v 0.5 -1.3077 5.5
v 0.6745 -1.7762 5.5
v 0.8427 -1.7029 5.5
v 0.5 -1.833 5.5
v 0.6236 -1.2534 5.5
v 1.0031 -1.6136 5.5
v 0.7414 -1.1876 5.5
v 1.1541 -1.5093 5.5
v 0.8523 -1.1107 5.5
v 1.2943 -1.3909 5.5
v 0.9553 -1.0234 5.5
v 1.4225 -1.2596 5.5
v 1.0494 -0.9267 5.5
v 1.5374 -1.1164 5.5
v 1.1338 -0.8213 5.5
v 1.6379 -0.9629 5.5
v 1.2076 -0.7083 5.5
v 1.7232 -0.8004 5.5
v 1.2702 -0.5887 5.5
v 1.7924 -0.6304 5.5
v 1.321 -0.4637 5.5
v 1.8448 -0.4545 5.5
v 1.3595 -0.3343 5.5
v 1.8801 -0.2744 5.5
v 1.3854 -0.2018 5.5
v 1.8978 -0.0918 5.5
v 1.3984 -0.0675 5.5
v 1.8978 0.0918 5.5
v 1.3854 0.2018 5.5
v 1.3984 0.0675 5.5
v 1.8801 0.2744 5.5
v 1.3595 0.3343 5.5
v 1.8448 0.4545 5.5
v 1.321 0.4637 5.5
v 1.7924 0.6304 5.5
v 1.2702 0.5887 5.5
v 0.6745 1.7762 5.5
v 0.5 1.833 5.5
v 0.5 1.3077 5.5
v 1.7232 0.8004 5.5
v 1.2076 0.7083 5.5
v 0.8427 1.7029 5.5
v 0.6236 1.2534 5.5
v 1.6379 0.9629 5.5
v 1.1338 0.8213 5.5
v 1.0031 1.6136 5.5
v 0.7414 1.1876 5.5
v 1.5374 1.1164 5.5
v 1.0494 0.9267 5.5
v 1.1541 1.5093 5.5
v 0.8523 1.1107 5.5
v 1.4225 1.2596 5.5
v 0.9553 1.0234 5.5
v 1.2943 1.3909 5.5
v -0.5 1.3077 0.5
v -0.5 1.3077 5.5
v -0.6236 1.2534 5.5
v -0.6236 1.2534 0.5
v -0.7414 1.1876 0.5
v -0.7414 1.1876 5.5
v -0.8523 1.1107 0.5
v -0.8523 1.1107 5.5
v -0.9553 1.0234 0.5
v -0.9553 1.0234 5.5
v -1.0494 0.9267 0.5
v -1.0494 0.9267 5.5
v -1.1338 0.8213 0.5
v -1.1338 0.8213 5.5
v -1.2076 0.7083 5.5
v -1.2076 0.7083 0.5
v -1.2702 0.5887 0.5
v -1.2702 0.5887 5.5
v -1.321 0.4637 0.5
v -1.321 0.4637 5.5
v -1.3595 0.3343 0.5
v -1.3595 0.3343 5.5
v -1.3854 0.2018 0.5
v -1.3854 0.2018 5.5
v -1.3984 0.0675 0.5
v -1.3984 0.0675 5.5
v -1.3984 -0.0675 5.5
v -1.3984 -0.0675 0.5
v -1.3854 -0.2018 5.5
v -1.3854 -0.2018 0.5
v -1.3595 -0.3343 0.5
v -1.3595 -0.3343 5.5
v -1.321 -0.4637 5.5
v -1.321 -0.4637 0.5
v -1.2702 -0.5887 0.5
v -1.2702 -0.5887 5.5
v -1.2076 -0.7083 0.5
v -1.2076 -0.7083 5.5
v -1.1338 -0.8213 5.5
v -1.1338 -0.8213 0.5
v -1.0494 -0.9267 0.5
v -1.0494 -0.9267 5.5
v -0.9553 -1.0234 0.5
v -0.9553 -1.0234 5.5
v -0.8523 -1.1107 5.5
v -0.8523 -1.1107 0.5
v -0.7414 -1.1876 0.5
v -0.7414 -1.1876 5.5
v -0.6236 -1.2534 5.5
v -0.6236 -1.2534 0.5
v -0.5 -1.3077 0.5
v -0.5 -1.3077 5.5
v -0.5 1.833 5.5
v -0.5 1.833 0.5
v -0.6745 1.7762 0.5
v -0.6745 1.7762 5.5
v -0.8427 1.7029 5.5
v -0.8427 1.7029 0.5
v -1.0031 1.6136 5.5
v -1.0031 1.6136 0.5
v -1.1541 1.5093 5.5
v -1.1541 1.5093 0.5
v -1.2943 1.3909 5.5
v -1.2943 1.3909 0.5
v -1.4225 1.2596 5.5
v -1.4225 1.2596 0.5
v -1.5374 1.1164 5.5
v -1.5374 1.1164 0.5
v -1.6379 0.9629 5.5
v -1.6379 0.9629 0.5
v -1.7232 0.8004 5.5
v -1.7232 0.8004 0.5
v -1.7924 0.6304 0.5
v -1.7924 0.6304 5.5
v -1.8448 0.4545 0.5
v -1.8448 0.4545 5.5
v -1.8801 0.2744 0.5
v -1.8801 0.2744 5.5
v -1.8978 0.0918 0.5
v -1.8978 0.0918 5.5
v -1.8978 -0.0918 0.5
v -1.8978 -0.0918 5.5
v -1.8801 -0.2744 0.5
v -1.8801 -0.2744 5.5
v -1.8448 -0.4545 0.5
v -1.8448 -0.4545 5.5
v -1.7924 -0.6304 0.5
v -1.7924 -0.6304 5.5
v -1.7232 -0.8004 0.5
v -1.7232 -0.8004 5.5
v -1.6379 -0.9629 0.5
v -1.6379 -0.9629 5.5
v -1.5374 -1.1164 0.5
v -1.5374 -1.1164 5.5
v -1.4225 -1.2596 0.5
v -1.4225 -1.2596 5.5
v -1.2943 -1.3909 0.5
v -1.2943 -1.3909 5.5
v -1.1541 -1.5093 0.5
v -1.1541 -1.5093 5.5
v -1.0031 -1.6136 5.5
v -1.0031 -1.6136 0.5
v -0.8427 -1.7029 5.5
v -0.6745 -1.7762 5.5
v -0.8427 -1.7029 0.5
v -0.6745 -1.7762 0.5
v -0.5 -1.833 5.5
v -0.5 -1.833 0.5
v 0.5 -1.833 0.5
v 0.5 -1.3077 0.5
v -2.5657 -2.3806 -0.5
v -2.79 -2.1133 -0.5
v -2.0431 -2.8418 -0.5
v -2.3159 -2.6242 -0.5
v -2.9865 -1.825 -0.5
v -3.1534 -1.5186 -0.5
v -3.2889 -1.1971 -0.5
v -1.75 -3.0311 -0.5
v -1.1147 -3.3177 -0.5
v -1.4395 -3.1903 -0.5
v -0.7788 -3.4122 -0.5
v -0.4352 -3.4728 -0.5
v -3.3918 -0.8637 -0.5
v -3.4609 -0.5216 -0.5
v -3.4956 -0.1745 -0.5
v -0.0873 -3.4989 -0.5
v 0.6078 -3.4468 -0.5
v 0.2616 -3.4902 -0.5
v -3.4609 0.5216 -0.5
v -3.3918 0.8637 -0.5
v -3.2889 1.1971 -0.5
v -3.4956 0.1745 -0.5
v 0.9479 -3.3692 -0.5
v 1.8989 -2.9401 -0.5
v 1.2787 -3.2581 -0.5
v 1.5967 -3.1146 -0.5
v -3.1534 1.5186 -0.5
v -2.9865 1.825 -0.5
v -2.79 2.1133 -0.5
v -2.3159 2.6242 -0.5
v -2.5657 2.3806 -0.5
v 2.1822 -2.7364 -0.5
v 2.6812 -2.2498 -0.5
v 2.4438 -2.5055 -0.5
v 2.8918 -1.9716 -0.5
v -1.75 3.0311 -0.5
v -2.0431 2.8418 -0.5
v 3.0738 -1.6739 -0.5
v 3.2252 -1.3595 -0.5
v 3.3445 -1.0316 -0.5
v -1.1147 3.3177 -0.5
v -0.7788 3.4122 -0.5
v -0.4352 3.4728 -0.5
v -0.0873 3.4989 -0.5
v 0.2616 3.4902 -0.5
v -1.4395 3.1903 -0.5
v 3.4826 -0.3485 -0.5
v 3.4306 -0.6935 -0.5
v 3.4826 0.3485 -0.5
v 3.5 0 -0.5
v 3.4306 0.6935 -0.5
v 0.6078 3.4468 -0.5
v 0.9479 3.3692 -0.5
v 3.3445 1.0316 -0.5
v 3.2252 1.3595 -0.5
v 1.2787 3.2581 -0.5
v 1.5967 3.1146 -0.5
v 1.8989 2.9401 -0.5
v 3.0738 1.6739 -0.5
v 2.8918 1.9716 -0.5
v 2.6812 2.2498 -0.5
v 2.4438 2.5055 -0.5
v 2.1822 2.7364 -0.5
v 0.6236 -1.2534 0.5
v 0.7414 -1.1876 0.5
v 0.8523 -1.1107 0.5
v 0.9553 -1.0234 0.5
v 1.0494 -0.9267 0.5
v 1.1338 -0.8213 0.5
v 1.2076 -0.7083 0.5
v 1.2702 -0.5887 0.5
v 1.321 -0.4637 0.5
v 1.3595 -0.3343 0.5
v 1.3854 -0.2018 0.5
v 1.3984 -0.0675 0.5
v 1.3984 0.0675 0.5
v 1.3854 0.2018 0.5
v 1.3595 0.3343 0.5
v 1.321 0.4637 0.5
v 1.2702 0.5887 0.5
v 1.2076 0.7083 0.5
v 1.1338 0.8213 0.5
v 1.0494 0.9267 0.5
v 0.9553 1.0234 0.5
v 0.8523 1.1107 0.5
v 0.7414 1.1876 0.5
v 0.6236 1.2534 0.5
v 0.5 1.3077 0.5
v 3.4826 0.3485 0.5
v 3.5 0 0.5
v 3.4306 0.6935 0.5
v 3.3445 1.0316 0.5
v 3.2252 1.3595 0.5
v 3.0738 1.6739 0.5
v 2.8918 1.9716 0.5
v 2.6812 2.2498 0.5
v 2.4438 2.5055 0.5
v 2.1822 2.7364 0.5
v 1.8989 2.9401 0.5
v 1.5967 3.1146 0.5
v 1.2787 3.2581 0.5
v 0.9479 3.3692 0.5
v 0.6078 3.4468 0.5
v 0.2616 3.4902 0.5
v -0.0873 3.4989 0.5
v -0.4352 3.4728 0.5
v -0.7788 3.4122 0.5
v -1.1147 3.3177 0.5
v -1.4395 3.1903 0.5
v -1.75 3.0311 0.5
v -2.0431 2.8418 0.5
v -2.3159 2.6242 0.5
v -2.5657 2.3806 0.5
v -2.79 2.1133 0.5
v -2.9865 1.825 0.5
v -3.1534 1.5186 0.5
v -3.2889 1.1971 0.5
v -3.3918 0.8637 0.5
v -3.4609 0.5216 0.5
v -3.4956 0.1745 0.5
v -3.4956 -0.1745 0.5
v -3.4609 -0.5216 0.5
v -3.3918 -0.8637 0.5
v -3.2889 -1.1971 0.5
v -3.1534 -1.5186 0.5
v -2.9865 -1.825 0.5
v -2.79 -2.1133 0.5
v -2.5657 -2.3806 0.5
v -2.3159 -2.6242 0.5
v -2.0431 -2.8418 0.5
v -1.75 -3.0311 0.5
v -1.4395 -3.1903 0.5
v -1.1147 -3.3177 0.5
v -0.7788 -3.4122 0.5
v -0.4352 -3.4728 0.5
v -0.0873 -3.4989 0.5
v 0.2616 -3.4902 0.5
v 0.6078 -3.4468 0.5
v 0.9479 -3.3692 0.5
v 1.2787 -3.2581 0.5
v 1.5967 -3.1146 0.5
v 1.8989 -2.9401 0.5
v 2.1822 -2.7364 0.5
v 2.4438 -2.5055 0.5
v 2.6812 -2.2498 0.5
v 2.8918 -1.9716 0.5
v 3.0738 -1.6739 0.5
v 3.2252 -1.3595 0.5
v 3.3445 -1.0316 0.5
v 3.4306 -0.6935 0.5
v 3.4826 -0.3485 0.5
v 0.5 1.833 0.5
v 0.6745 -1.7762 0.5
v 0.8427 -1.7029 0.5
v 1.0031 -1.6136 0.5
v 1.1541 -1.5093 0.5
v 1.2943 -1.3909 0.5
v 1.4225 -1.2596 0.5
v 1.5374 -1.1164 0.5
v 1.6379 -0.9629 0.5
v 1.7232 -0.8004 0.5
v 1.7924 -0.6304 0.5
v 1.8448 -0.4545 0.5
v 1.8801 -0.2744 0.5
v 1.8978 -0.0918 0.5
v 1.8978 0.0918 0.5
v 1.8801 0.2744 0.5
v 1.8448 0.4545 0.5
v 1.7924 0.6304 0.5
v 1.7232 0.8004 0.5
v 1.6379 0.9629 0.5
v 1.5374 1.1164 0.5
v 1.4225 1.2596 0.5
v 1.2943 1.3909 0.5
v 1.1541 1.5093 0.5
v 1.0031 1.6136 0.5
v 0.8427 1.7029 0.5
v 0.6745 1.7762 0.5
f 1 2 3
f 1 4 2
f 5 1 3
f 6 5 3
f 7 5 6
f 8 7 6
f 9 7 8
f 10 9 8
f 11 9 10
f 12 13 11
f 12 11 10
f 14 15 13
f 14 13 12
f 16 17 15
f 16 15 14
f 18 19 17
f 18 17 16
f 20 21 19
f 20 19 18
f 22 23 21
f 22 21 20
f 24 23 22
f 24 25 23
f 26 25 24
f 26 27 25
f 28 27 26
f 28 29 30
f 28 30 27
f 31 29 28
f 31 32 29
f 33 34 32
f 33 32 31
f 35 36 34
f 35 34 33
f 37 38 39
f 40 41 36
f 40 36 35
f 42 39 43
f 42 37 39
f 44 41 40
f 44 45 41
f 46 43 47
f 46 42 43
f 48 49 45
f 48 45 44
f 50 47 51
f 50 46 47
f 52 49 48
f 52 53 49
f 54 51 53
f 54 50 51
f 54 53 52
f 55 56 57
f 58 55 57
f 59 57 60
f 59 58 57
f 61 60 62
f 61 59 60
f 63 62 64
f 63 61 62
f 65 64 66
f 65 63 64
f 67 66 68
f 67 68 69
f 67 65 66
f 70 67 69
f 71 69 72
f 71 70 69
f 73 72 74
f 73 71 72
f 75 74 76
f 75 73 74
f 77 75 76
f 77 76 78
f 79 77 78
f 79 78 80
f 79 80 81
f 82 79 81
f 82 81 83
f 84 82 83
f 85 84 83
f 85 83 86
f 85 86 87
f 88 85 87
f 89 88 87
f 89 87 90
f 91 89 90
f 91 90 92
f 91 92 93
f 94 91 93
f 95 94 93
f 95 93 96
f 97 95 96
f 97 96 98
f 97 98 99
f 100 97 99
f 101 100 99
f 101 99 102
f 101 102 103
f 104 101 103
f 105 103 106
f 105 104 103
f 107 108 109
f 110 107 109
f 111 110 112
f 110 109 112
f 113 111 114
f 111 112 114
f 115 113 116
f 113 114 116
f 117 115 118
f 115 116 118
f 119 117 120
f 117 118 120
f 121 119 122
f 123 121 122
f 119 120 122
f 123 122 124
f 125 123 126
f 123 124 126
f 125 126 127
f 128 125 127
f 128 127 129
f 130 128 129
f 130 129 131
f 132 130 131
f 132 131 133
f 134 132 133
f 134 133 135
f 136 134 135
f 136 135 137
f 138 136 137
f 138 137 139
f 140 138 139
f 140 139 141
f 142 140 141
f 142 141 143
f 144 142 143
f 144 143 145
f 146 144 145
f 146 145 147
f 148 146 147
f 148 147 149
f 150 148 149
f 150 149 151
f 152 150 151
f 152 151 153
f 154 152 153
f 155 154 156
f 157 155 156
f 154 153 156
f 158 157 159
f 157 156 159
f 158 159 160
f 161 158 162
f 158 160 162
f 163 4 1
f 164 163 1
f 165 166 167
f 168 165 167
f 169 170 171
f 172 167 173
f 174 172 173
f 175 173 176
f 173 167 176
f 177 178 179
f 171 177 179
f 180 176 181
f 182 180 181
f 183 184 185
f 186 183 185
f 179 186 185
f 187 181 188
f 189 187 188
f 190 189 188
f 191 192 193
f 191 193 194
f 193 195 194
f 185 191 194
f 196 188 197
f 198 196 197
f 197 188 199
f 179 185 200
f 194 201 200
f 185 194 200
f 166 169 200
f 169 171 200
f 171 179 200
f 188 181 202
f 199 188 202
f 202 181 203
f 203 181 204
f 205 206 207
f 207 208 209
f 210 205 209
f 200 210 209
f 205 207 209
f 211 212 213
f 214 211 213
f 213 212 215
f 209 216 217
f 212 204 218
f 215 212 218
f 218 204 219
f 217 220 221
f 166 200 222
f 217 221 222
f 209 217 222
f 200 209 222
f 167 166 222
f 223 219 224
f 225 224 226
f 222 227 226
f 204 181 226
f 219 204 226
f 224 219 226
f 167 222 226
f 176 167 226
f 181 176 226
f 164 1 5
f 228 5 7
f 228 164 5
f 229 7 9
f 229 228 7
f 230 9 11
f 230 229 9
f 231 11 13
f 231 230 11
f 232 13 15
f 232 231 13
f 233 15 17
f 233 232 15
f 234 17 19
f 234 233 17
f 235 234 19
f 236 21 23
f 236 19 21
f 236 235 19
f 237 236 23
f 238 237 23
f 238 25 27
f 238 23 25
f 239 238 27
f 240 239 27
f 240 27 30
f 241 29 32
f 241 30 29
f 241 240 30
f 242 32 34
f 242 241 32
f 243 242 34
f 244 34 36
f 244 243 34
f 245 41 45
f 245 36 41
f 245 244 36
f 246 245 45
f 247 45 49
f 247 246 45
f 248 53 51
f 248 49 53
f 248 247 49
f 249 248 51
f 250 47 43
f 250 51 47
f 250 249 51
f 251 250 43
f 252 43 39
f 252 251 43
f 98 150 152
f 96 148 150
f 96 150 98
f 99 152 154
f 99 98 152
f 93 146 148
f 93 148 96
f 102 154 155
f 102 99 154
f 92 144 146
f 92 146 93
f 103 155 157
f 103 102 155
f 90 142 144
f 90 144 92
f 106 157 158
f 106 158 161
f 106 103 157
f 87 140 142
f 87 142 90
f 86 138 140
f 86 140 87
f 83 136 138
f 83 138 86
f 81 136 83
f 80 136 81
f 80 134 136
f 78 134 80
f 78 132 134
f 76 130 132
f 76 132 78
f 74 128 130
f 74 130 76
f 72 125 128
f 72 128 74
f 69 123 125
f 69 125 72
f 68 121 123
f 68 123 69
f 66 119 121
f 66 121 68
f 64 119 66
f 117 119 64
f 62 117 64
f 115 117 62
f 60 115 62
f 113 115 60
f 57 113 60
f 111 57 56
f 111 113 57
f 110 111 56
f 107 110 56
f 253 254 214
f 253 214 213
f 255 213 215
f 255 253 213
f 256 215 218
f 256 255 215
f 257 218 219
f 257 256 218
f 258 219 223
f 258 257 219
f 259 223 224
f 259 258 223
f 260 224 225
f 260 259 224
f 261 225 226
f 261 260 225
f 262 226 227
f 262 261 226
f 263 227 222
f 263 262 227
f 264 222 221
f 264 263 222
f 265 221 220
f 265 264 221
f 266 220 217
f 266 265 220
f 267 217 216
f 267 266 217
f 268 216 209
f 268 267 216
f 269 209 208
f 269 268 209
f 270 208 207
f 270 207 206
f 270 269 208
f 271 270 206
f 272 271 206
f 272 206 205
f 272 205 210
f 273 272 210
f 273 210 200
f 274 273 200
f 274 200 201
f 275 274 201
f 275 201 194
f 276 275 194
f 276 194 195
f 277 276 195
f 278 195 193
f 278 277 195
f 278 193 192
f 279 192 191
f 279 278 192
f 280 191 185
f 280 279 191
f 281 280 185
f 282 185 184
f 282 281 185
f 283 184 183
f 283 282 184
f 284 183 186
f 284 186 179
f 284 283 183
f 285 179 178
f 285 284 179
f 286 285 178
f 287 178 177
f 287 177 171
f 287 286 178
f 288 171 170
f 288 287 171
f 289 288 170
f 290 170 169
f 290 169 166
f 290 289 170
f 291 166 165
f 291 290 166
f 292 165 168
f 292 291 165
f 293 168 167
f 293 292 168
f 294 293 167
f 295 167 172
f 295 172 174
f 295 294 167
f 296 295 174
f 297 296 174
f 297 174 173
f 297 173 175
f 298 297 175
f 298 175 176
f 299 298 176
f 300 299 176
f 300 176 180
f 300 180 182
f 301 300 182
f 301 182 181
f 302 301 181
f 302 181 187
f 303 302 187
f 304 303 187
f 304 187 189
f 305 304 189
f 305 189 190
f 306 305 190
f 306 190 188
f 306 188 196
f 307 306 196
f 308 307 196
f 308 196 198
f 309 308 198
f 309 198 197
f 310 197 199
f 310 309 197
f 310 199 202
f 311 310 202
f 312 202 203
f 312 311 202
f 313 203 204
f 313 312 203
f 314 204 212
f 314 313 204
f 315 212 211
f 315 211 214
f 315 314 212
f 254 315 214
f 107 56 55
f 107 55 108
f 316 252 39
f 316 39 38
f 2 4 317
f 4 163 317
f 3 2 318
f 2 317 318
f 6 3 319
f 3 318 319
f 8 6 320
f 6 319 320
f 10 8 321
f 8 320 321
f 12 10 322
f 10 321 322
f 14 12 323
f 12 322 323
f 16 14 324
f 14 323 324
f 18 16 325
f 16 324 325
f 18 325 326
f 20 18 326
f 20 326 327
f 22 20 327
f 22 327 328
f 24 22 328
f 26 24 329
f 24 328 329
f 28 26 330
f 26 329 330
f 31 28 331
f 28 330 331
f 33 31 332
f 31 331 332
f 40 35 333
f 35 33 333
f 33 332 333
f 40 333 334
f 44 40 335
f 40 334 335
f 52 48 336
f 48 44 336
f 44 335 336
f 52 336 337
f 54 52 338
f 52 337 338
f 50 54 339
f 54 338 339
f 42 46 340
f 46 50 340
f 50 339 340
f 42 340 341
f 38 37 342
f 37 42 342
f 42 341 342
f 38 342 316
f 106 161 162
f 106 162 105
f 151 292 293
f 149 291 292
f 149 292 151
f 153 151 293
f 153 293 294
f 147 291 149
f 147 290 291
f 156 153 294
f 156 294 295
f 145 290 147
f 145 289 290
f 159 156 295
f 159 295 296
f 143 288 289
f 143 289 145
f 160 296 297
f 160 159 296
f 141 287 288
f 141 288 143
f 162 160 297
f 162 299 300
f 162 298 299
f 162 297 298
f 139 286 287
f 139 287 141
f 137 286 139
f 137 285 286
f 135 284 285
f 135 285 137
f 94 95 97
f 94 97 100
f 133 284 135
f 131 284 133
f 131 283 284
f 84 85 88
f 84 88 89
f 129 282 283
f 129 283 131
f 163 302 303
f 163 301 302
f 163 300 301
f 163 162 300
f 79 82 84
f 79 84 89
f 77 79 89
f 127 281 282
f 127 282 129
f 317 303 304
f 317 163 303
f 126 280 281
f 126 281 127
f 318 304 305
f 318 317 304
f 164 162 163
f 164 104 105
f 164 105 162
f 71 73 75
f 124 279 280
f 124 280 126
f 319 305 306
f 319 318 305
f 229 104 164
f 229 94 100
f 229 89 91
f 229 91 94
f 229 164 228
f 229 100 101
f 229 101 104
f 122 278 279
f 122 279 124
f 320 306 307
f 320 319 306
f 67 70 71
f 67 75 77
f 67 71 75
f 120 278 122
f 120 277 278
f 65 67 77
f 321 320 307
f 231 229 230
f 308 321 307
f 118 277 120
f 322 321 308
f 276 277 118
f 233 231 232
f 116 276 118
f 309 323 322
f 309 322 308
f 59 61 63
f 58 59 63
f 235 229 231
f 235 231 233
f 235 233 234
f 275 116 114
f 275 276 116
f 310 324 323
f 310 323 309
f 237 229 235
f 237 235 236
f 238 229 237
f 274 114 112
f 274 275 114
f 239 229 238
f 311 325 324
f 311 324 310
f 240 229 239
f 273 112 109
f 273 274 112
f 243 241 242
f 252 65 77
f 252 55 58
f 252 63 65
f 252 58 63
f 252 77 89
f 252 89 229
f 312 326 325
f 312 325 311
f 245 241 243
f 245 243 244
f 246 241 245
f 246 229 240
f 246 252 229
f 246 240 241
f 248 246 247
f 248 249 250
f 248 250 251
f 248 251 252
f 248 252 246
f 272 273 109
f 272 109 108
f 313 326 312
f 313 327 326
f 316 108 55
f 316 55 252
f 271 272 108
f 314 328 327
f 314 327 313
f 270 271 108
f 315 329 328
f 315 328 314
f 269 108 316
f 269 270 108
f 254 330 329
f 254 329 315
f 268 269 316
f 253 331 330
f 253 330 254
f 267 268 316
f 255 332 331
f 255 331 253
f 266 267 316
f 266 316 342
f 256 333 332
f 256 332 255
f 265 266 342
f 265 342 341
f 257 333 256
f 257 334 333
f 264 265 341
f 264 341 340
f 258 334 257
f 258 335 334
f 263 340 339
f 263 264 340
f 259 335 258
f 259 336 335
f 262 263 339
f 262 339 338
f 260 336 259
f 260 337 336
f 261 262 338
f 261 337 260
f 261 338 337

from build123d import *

# Parameters (mm, degrees)
F0_R     = 3.5
F1_DEPTH = 0.5
F2_R     = 1.9
F2_R_2   = 1.4
F3_DEPTH = 5
F4_W     = 1
F4_H     = 6.460969
F5_DEPTH = 5


with BuildPart() as f1:
    # F0 (on Top) → F1 (new body, symmetric)
    with BuildSketch(Plane.XY):
        Circle(F0_R)
    extrude(amount=F1_DEPTH, both=True)

    # F2 (on face) → F3 (join)
    with BuildSketch(Plane.XY.offset(0.5)):
        Circle(F2_R)
        Circle(F2_R_2, mode=Mode.SUBTRACT)
    extrude(amount=F3_DEPTH)

    # F4 (on face) → F5 (cut)
    with BuildSketch(Plane.XY.offset(5.5)):
        with Locations((0, -0.287181)):
            Rectangle(F4_W, F4_H)
    extrude(amount=-F5_DEPTH, mode=Mode.SUBTRACT)


solid = f1.part
